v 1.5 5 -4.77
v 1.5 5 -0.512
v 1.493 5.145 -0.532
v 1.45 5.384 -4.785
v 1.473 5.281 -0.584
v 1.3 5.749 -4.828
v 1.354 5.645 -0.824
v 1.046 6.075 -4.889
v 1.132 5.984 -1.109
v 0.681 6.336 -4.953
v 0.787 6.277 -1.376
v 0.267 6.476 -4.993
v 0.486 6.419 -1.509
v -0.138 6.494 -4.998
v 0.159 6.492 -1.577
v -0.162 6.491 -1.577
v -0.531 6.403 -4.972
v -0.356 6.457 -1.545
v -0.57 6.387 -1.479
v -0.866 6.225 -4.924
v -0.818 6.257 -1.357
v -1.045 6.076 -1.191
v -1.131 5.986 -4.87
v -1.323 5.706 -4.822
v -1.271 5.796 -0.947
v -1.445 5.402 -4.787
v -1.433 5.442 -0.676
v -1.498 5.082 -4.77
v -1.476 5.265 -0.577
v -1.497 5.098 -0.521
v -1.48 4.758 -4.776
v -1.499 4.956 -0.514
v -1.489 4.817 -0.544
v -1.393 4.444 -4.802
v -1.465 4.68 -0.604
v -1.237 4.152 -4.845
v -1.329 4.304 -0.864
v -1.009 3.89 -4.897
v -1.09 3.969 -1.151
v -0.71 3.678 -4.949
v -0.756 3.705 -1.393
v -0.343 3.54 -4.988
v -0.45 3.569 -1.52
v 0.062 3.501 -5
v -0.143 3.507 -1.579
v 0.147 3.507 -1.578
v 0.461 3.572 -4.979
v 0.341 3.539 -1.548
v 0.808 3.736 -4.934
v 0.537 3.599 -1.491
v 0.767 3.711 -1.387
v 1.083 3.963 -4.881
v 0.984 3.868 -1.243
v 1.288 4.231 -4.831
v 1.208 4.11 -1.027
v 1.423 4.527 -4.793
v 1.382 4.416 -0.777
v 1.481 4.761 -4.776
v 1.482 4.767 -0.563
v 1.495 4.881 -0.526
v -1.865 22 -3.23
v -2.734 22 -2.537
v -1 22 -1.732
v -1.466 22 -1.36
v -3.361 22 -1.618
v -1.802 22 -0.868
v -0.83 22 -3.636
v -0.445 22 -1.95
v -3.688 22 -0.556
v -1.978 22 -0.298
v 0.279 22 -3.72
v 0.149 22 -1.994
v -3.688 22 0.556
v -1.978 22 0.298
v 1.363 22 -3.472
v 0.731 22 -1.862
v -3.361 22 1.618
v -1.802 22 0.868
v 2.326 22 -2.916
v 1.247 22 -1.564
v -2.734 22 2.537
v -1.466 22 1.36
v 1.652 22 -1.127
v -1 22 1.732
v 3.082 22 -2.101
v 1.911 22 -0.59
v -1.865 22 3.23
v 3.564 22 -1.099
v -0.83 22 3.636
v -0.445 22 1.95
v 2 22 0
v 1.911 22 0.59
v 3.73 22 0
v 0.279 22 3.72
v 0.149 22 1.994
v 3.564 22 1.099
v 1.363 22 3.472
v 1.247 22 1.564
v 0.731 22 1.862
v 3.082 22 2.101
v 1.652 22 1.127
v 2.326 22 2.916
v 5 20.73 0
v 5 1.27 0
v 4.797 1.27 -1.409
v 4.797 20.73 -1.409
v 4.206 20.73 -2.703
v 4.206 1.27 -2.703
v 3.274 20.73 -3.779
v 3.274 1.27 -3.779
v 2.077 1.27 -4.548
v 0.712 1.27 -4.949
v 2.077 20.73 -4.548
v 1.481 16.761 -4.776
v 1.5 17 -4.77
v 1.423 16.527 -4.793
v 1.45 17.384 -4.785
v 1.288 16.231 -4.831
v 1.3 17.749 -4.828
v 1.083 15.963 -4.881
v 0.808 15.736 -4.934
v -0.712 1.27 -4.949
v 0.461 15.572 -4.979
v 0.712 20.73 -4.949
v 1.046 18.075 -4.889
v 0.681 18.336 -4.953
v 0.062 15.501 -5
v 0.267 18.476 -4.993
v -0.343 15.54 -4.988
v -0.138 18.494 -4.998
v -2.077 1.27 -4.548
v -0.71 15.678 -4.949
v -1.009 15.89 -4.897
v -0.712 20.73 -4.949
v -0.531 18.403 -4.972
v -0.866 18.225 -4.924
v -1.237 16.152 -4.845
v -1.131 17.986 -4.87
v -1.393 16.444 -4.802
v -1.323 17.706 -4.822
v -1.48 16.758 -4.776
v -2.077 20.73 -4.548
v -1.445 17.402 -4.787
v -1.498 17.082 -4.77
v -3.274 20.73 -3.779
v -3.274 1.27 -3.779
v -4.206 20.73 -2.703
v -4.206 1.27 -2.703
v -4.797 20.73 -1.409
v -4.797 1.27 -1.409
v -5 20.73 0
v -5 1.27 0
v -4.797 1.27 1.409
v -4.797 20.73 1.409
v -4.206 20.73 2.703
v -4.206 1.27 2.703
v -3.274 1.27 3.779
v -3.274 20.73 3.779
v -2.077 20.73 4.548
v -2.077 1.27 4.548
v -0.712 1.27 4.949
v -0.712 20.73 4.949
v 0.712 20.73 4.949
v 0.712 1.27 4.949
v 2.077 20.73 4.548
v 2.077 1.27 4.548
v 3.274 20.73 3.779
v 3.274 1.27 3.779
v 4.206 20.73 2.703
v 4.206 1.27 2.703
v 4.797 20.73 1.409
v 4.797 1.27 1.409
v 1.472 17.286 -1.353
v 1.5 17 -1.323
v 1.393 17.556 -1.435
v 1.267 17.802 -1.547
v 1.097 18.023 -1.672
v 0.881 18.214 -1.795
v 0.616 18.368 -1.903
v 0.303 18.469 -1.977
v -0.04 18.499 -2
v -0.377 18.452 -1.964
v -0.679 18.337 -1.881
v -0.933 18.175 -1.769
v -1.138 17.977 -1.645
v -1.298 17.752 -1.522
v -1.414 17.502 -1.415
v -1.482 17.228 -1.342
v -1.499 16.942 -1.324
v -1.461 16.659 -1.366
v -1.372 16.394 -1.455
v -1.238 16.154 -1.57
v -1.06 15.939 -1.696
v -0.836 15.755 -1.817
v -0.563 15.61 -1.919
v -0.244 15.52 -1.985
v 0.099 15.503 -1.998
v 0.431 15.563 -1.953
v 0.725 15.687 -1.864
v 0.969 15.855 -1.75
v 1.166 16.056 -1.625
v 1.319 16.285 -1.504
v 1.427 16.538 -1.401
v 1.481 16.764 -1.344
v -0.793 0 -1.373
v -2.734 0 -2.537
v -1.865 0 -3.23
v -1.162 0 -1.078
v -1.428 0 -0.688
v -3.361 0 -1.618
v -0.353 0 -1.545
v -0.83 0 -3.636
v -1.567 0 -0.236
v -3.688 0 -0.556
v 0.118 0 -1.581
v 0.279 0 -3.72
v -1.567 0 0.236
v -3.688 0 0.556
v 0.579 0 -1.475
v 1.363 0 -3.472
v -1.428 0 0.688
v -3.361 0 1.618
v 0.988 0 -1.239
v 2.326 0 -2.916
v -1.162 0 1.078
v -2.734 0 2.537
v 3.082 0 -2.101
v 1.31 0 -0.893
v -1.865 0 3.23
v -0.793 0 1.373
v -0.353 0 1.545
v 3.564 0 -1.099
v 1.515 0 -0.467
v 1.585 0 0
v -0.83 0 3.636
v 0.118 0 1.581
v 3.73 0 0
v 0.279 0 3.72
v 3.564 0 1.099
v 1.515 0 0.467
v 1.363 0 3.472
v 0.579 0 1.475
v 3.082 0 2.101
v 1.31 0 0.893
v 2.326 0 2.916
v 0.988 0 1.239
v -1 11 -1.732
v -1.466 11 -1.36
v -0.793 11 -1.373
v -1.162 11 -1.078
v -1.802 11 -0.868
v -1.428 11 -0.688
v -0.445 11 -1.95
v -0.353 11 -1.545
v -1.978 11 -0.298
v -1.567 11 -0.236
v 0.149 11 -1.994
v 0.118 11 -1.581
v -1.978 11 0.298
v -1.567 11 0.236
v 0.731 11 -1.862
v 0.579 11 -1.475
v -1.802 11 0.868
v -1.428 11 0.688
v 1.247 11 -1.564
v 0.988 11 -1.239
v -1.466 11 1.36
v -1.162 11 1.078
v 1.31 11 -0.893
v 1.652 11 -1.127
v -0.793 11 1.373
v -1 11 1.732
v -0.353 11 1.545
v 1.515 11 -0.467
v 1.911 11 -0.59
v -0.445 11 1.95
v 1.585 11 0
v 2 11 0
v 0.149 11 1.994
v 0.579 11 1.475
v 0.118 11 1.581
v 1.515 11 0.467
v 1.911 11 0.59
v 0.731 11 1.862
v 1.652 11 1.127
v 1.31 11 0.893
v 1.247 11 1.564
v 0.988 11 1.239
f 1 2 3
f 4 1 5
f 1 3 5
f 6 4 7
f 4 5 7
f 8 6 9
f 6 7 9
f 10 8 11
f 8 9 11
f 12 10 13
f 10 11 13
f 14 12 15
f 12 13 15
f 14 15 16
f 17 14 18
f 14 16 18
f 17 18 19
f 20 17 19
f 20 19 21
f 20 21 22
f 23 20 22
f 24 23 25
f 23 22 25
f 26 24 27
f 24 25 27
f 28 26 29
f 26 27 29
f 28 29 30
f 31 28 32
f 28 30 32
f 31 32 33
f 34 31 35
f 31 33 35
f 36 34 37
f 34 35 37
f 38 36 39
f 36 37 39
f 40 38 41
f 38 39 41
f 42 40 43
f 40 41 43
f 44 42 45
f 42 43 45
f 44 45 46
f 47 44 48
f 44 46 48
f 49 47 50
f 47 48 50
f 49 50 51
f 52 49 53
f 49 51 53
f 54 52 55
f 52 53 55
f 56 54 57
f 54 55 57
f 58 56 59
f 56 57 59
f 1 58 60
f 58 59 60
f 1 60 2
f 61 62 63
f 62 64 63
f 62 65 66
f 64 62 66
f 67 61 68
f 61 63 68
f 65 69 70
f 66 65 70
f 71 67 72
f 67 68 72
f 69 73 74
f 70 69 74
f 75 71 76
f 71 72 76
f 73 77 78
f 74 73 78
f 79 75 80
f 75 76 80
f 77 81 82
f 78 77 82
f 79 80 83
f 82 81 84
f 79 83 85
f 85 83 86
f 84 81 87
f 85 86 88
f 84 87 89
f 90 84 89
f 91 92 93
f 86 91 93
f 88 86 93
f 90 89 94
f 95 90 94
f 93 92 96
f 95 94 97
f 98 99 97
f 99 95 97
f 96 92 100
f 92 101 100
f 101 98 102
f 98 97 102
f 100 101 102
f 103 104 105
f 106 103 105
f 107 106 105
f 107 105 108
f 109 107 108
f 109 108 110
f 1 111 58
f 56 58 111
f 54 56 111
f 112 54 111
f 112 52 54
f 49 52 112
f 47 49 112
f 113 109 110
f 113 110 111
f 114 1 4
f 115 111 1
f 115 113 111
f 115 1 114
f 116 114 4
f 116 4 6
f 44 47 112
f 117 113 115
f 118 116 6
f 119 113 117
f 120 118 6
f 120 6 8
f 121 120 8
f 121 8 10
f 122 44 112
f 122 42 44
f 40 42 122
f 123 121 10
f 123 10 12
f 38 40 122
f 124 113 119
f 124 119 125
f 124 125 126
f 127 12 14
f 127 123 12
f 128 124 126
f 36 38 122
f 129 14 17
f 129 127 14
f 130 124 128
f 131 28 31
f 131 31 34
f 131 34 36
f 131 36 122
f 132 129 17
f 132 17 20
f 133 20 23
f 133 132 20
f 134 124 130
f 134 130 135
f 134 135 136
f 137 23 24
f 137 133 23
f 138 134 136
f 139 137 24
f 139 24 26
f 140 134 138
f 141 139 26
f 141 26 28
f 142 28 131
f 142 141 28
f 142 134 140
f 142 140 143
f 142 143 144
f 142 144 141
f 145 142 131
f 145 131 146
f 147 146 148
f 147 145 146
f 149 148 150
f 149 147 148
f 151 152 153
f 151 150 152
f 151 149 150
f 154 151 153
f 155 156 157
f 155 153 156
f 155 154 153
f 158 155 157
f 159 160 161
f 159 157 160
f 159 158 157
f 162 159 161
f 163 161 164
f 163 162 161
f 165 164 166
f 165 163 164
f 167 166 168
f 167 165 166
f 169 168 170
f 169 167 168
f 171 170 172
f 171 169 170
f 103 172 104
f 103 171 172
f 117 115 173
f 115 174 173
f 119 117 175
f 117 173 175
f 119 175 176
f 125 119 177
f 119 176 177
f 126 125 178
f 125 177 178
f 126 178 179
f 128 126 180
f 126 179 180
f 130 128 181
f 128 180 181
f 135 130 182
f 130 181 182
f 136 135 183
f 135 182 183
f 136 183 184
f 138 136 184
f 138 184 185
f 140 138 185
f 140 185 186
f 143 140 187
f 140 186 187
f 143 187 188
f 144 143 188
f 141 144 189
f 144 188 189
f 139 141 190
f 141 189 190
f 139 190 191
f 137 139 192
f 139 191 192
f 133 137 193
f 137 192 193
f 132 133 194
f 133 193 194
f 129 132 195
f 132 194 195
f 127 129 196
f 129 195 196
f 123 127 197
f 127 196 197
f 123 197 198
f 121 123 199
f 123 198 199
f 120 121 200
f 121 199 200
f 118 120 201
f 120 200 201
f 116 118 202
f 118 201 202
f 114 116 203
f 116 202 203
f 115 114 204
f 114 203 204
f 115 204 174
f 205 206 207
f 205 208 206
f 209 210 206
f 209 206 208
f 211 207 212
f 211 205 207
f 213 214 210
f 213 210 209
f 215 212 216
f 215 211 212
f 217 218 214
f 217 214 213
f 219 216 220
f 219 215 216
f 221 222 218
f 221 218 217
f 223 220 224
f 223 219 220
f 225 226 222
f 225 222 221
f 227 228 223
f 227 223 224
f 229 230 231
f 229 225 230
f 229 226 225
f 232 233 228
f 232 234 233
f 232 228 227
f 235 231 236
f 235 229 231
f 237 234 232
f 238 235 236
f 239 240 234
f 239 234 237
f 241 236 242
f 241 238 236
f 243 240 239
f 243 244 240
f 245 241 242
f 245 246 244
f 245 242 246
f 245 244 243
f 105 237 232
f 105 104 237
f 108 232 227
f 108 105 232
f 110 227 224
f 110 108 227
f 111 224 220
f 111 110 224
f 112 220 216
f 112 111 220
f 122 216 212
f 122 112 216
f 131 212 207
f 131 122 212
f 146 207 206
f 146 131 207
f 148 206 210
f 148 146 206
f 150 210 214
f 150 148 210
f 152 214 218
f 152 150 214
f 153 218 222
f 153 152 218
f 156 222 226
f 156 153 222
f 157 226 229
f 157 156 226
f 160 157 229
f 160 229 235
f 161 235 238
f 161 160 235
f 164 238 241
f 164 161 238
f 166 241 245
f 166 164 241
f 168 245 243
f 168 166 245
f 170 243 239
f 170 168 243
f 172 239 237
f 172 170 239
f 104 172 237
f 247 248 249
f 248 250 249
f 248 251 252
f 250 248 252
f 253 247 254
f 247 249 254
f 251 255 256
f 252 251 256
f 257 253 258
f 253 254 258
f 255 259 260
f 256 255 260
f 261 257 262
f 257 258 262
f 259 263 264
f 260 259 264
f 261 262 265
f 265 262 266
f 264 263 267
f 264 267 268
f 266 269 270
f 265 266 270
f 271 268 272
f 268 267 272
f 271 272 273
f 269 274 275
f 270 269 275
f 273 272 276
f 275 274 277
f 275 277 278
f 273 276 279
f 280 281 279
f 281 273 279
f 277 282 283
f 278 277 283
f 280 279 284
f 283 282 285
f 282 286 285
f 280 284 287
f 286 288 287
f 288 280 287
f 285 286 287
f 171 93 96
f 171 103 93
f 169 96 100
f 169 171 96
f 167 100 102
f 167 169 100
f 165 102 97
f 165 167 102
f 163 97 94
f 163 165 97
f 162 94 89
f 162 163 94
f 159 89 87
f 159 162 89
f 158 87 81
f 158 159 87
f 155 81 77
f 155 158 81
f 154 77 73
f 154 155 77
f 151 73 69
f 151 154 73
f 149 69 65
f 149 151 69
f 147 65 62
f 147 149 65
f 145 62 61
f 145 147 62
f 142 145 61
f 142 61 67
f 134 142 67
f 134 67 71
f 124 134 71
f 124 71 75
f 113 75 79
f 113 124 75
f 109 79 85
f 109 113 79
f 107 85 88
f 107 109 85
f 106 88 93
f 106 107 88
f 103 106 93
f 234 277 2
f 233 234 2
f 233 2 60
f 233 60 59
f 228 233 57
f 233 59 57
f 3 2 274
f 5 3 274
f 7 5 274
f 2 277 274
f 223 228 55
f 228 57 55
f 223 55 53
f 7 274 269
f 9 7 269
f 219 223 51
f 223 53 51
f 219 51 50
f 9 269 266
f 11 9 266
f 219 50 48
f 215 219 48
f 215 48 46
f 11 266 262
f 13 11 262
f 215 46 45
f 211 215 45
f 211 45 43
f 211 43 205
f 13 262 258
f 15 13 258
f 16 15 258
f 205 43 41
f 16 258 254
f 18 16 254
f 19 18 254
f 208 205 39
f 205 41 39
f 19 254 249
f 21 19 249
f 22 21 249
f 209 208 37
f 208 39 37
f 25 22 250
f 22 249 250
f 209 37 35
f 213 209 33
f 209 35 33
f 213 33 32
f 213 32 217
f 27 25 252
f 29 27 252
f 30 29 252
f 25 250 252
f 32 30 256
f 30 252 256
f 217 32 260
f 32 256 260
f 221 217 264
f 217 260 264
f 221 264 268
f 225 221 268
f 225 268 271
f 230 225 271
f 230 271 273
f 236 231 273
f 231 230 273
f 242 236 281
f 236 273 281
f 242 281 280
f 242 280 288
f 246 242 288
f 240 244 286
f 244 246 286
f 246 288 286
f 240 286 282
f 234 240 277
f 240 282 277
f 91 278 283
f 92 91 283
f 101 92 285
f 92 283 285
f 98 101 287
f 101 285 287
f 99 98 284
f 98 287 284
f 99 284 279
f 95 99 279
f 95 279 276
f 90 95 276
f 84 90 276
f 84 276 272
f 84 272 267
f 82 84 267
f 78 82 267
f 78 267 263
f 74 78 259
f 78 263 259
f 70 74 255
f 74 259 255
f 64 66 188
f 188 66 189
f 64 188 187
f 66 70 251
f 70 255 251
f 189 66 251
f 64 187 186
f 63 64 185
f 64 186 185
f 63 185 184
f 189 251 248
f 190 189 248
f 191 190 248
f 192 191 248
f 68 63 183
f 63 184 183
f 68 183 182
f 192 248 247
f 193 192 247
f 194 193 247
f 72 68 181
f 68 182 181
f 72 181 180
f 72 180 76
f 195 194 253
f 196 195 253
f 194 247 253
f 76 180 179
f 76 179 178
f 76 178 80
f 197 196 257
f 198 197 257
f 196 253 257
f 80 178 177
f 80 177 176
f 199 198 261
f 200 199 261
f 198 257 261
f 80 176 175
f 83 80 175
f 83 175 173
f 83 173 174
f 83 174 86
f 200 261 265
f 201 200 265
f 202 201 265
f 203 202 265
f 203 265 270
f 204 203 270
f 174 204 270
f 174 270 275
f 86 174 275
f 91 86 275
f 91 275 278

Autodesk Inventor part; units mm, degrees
ref_plane "YZ Plane" through (0, 0, 0) normal (1, 0, 0) x (0, 1, 0)
ref_plane "XZ Plane" through (0, 0, 0) normal (0, 1, 0) x (-1, 0, 0)
ref_plane "XY Plane" through (0, 0, 0) normal (0, 0, 1) x (1, 0, 0)
sketch "Sketch1" plane through (0, 0, 0) normal (0, 0, 1) x (1, 0, 0)
  line L0 (0, 0) -> (5, 0)
  line L1 (5, 0) -> (5, 22)
  line L2 (5, 22) -> (0, 22)
  line L3 (0, 0) -> (1.585, 0)
  line L4 (1.585, 0) -> (1.585, 11)
  line L5 (0, 22) -> (2, 22)
  line L6 (2, 22) -> (2, 11)
  line L7 (2, 11) -> (1.585, 11)
  circle A0 centre (0, 17) radius 1.5
  circle A1 centre (0, 5) radius 1.5
  line L8 (0, 0) -> (0, -2.0166)
  dimension "d0" = 5
  dimension "d1" = 22
  dimension "d2" = 1.585
  dimension "d3" = 2
  dimension "d4" = 3
  dimension "d5" = 3
  dimension "d6" = 5
  dimension "d7" = 5
revolve "Revolution1" add sketch "Sketch1" angle 360 about axis through (0, 0, 0) along (0, -1, 0) contours L4 L7 L6 L2 L1 L0
extrude "Extrusion1" cut sketch "Sketch1" against normal blind 25.4 contours A0 | A1
chamfer "Chamfer1" distance 1.27 angle 45 2 edges at (-5, 22, 0) (-5, 0, 0)
properties part number "MotorShaftCoupler"
